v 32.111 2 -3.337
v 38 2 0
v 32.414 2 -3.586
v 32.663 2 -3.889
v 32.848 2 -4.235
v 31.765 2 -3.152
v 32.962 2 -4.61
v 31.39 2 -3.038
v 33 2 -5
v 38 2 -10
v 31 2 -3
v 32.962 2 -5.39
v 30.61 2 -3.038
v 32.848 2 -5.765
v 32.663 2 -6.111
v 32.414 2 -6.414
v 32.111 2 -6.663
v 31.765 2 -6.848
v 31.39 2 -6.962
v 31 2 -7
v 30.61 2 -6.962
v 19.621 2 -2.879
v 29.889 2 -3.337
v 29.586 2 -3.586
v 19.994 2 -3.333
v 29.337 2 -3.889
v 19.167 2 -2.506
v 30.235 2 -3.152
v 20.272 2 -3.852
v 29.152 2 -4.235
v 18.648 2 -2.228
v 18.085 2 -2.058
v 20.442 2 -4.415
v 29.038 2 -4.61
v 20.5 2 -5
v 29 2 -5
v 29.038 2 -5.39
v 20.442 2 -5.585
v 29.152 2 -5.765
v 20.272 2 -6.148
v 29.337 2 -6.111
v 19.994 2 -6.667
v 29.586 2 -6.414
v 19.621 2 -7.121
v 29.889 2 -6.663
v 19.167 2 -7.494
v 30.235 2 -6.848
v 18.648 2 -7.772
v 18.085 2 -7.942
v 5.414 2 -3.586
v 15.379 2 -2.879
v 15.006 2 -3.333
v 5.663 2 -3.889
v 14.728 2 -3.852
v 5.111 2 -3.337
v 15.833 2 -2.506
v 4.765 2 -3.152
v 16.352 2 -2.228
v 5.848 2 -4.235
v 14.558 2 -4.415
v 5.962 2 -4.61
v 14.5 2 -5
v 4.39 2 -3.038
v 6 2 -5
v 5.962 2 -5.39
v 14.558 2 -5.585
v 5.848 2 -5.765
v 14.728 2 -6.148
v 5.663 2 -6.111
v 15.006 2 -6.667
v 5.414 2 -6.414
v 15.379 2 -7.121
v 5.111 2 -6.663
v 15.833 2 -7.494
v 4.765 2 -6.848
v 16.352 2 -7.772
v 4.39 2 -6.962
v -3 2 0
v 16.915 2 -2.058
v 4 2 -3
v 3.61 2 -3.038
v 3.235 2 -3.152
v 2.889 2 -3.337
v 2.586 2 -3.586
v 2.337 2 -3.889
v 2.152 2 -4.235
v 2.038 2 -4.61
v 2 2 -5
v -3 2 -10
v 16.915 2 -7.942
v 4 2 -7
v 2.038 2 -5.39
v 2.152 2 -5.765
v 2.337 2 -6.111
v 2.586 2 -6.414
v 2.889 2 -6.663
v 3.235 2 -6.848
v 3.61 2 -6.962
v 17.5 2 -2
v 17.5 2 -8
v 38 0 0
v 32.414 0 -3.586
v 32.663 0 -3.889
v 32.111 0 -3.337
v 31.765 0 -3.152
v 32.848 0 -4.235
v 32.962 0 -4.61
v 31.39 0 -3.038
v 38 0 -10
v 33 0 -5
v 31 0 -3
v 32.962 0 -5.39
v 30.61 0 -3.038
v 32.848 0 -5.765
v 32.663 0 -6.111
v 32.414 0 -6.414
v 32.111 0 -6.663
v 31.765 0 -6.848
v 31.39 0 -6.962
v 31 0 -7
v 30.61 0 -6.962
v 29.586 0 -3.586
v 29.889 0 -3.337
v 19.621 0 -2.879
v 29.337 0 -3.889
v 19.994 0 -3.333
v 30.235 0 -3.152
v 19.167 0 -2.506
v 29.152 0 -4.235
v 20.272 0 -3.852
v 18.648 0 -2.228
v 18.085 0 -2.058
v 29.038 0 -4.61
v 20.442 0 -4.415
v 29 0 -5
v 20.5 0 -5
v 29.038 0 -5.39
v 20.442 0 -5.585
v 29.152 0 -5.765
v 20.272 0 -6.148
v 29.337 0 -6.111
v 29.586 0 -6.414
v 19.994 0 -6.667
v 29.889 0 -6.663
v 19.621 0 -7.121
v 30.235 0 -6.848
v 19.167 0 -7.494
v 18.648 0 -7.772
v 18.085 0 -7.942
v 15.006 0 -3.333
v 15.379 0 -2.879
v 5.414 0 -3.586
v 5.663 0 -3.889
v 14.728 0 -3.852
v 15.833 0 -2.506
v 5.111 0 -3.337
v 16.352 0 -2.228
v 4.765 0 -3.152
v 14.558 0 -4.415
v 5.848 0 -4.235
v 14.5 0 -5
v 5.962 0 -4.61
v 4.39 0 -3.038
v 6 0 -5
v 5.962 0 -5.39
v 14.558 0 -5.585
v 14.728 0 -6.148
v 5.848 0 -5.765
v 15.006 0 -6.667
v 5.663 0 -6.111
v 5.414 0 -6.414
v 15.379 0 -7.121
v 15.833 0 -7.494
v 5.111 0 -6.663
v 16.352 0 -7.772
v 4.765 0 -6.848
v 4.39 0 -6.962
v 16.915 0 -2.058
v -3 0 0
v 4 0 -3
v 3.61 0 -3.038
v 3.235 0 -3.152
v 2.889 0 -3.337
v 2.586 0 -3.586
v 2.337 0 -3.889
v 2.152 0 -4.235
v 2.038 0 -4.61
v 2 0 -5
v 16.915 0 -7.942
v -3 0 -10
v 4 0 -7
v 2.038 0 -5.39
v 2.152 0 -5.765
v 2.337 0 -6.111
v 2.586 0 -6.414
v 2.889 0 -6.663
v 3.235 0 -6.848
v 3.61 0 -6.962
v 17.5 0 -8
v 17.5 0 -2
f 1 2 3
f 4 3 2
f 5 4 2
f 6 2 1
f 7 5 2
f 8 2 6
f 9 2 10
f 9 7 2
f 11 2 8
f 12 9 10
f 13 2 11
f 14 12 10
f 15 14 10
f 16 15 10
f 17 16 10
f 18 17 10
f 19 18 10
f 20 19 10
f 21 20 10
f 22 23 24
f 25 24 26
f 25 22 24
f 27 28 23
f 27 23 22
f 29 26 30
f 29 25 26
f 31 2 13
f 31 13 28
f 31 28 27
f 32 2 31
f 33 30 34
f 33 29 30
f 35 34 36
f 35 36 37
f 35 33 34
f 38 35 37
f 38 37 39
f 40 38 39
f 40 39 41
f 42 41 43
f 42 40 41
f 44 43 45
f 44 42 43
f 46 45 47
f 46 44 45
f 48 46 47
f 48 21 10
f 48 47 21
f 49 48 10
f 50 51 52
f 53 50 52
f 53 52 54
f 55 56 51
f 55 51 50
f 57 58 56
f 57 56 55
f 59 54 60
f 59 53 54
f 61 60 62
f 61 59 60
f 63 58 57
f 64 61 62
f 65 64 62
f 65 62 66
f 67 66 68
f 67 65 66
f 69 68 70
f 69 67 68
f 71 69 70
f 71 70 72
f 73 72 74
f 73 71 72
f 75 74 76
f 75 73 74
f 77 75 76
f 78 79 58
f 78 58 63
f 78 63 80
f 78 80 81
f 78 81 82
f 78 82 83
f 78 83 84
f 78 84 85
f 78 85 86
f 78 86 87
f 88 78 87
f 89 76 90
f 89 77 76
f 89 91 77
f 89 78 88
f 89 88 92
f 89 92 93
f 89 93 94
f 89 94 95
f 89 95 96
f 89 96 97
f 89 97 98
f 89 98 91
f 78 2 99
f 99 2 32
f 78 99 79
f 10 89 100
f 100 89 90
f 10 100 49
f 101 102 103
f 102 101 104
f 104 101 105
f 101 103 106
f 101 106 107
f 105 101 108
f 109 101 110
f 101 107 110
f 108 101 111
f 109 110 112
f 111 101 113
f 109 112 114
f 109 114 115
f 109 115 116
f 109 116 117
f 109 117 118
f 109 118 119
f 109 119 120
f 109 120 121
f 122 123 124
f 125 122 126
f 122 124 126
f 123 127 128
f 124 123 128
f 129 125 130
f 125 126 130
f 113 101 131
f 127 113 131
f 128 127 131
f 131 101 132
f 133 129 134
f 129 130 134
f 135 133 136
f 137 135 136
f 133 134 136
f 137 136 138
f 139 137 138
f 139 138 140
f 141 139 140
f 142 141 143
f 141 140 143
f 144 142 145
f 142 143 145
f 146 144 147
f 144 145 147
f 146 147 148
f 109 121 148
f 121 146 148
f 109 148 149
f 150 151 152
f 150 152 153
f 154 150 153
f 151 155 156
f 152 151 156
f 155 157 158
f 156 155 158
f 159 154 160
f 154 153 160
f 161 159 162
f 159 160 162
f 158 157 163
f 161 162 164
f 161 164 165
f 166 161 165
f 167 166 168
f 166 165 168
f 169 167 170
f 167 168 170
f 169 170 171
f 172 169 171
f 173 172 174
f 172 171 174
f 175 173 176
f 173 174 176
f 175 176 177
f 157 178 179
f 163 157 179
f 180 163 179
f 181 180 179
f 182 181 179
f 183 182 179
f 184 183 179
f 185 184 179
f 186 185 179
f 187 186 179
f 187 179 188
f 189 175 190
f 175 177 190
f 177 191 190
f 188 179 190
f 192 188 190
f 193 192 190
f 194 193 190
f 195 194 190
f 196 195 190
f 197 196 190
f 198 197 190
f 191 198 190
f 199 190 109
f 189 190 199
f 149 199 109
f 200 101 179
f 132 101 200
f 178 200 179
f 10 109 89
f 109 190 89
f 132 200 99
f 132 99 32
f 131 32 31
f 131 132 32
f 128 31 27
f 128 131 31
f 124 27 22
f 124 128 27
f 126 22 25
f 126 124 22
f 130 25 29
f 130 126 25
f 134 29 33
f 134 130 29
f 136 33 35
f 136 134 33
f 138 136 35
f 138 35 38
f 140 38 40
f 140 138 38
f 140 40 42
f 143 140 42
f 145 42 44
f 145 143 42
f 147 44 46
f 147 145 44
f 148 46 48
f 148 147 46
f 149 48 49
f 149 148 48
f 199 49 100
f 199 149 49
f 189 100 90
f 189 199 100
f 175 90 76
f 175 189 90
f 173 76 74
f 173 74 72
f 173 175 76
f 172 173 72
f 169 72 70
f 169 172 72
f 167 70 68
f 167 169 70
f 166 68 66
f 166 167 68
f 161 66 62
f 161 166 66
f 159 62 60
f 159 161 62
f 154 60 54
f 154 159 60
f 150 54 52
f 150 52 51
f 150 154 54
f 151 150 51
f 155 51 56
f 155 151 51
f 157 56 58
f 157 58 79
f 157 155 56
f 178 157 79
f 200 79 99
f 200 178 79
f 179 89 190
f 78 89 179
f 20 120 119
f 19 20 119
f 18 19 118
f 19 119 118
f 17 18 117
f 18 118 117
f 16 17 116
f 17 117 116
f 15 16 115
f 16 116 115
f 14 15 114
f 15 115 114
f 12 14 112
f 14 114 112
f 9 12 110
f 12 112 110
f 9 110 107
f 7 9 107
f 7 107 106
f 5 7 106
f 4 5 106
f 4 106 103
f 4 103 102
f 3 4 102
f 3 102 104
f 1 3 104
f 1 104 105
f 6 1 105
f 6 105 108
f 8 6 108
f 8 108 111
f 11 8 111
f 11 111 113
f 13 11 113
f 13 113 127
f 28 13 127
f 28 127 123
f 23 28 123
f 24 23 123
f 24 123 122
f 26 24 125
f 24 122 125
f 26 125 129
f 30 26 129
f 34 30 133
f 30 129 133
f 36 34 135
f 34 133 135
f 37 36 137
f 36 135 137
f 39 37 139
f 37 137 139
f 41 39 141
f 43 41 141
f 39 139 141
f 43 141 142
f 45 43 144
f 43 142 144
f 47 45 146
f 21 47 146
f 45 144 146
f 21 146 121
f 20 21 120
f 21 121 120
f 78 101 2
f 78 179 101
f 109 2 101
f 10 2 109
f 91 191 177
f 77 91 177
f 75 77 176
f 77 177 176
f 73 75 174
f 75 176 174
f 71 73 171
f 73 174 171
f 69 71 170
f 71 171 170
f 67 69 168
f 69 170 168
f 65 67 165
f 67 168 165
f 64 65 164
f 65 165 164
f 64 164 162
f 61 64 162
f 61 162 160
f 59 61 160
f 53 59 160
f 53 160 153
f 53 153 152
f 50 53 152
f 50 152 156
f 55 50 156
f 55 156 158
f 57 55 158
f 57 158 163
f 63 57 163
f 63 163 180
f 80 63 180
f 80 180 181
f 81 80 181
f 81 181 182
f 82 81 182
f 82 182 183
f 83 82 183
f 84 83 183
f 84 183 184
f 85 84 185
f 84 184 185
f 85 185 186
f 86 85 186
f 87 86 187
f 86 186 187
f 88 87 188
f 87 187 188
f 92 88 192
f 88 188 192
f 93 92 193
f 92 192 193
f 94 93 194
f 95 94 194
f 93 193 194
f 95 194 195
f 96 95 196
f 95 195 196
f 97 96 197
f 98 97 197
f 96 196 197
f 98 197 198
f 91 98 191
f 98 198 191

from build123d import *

# Parameters (mm, degrees)
SKETCH1_W           = 35
SKETCH1_H           = 10
SKETCH1_R           = 3
BOSS_EXTRUDE1_DEPTH = 2
SKETCH4_R           = 2
CUT_EXTRUDE2_DEPTH  = 20
SKETCH5_W           = 10
SKETCH5_H           = 2
BOSS_EXTRUDE3_DEPTH = 3
SKETCH6_W           = 10
SKETCH6_H           = 2
BOSS_EXTRUDE4_DEPTH = 3


with BuildPart() as part:
    # Sketch1 → Boss-Extrude1 (new body)
    with BuildSketch(Plane(origin=(0, 0, 0), x_dir=(1, 0, 0), z_dir=(0, 1, 0))):
        with Locations((17.5, 5)):
            Rectangle(SKETCH1_W, SKETCH1_H)
        with Locations(Location((17.5, 5, 0), (0, 0, 270))):
            Circle(SKETCH1_R, mode=Mode.SUBTRACT)
    extrude(amount=BOSS_EXTRUDE1_DEPTH)

    # Sketch4 → Cut-Extrude2 (cut)
    with BuildSketch(Plane.XZ):
        with Locations(Location((4, -5, 0), (0, 0, 270))):
            Circle(SKETCH4_R)
        with Locations(Location((31, -5, 0), (0, 0, 270))):
            Circle(SKETCH4_R)
    extrude(amount=-CUT_EXTRUDE2_DEPTH, mode=Mode.SUBTRACT)

    # Sketch5 → Boss-Extrude3 (add)
    with BuildSketch(Plane.ZY):
        with Locations((-5, 1)):
            Rectangle(SKETCH5_W, SKETCH5_H)
    extrude(amount=BOSS_EXTRUDE3_DEPTH)

    # Sketch6 → Boss-Extrude4 (add)
    with BuildSketch(Plane(origin=(35, 0, 0), x_dir=(0, 0, -1), z_dir=(1, 0, 0))):
        with Locations((5, 1)):
            Rectangle(SKETCH6_W, SKETCH6_H)
    extrude(amount=BOSS_EXTRUDE4_DEPTH)


solid = part.part
